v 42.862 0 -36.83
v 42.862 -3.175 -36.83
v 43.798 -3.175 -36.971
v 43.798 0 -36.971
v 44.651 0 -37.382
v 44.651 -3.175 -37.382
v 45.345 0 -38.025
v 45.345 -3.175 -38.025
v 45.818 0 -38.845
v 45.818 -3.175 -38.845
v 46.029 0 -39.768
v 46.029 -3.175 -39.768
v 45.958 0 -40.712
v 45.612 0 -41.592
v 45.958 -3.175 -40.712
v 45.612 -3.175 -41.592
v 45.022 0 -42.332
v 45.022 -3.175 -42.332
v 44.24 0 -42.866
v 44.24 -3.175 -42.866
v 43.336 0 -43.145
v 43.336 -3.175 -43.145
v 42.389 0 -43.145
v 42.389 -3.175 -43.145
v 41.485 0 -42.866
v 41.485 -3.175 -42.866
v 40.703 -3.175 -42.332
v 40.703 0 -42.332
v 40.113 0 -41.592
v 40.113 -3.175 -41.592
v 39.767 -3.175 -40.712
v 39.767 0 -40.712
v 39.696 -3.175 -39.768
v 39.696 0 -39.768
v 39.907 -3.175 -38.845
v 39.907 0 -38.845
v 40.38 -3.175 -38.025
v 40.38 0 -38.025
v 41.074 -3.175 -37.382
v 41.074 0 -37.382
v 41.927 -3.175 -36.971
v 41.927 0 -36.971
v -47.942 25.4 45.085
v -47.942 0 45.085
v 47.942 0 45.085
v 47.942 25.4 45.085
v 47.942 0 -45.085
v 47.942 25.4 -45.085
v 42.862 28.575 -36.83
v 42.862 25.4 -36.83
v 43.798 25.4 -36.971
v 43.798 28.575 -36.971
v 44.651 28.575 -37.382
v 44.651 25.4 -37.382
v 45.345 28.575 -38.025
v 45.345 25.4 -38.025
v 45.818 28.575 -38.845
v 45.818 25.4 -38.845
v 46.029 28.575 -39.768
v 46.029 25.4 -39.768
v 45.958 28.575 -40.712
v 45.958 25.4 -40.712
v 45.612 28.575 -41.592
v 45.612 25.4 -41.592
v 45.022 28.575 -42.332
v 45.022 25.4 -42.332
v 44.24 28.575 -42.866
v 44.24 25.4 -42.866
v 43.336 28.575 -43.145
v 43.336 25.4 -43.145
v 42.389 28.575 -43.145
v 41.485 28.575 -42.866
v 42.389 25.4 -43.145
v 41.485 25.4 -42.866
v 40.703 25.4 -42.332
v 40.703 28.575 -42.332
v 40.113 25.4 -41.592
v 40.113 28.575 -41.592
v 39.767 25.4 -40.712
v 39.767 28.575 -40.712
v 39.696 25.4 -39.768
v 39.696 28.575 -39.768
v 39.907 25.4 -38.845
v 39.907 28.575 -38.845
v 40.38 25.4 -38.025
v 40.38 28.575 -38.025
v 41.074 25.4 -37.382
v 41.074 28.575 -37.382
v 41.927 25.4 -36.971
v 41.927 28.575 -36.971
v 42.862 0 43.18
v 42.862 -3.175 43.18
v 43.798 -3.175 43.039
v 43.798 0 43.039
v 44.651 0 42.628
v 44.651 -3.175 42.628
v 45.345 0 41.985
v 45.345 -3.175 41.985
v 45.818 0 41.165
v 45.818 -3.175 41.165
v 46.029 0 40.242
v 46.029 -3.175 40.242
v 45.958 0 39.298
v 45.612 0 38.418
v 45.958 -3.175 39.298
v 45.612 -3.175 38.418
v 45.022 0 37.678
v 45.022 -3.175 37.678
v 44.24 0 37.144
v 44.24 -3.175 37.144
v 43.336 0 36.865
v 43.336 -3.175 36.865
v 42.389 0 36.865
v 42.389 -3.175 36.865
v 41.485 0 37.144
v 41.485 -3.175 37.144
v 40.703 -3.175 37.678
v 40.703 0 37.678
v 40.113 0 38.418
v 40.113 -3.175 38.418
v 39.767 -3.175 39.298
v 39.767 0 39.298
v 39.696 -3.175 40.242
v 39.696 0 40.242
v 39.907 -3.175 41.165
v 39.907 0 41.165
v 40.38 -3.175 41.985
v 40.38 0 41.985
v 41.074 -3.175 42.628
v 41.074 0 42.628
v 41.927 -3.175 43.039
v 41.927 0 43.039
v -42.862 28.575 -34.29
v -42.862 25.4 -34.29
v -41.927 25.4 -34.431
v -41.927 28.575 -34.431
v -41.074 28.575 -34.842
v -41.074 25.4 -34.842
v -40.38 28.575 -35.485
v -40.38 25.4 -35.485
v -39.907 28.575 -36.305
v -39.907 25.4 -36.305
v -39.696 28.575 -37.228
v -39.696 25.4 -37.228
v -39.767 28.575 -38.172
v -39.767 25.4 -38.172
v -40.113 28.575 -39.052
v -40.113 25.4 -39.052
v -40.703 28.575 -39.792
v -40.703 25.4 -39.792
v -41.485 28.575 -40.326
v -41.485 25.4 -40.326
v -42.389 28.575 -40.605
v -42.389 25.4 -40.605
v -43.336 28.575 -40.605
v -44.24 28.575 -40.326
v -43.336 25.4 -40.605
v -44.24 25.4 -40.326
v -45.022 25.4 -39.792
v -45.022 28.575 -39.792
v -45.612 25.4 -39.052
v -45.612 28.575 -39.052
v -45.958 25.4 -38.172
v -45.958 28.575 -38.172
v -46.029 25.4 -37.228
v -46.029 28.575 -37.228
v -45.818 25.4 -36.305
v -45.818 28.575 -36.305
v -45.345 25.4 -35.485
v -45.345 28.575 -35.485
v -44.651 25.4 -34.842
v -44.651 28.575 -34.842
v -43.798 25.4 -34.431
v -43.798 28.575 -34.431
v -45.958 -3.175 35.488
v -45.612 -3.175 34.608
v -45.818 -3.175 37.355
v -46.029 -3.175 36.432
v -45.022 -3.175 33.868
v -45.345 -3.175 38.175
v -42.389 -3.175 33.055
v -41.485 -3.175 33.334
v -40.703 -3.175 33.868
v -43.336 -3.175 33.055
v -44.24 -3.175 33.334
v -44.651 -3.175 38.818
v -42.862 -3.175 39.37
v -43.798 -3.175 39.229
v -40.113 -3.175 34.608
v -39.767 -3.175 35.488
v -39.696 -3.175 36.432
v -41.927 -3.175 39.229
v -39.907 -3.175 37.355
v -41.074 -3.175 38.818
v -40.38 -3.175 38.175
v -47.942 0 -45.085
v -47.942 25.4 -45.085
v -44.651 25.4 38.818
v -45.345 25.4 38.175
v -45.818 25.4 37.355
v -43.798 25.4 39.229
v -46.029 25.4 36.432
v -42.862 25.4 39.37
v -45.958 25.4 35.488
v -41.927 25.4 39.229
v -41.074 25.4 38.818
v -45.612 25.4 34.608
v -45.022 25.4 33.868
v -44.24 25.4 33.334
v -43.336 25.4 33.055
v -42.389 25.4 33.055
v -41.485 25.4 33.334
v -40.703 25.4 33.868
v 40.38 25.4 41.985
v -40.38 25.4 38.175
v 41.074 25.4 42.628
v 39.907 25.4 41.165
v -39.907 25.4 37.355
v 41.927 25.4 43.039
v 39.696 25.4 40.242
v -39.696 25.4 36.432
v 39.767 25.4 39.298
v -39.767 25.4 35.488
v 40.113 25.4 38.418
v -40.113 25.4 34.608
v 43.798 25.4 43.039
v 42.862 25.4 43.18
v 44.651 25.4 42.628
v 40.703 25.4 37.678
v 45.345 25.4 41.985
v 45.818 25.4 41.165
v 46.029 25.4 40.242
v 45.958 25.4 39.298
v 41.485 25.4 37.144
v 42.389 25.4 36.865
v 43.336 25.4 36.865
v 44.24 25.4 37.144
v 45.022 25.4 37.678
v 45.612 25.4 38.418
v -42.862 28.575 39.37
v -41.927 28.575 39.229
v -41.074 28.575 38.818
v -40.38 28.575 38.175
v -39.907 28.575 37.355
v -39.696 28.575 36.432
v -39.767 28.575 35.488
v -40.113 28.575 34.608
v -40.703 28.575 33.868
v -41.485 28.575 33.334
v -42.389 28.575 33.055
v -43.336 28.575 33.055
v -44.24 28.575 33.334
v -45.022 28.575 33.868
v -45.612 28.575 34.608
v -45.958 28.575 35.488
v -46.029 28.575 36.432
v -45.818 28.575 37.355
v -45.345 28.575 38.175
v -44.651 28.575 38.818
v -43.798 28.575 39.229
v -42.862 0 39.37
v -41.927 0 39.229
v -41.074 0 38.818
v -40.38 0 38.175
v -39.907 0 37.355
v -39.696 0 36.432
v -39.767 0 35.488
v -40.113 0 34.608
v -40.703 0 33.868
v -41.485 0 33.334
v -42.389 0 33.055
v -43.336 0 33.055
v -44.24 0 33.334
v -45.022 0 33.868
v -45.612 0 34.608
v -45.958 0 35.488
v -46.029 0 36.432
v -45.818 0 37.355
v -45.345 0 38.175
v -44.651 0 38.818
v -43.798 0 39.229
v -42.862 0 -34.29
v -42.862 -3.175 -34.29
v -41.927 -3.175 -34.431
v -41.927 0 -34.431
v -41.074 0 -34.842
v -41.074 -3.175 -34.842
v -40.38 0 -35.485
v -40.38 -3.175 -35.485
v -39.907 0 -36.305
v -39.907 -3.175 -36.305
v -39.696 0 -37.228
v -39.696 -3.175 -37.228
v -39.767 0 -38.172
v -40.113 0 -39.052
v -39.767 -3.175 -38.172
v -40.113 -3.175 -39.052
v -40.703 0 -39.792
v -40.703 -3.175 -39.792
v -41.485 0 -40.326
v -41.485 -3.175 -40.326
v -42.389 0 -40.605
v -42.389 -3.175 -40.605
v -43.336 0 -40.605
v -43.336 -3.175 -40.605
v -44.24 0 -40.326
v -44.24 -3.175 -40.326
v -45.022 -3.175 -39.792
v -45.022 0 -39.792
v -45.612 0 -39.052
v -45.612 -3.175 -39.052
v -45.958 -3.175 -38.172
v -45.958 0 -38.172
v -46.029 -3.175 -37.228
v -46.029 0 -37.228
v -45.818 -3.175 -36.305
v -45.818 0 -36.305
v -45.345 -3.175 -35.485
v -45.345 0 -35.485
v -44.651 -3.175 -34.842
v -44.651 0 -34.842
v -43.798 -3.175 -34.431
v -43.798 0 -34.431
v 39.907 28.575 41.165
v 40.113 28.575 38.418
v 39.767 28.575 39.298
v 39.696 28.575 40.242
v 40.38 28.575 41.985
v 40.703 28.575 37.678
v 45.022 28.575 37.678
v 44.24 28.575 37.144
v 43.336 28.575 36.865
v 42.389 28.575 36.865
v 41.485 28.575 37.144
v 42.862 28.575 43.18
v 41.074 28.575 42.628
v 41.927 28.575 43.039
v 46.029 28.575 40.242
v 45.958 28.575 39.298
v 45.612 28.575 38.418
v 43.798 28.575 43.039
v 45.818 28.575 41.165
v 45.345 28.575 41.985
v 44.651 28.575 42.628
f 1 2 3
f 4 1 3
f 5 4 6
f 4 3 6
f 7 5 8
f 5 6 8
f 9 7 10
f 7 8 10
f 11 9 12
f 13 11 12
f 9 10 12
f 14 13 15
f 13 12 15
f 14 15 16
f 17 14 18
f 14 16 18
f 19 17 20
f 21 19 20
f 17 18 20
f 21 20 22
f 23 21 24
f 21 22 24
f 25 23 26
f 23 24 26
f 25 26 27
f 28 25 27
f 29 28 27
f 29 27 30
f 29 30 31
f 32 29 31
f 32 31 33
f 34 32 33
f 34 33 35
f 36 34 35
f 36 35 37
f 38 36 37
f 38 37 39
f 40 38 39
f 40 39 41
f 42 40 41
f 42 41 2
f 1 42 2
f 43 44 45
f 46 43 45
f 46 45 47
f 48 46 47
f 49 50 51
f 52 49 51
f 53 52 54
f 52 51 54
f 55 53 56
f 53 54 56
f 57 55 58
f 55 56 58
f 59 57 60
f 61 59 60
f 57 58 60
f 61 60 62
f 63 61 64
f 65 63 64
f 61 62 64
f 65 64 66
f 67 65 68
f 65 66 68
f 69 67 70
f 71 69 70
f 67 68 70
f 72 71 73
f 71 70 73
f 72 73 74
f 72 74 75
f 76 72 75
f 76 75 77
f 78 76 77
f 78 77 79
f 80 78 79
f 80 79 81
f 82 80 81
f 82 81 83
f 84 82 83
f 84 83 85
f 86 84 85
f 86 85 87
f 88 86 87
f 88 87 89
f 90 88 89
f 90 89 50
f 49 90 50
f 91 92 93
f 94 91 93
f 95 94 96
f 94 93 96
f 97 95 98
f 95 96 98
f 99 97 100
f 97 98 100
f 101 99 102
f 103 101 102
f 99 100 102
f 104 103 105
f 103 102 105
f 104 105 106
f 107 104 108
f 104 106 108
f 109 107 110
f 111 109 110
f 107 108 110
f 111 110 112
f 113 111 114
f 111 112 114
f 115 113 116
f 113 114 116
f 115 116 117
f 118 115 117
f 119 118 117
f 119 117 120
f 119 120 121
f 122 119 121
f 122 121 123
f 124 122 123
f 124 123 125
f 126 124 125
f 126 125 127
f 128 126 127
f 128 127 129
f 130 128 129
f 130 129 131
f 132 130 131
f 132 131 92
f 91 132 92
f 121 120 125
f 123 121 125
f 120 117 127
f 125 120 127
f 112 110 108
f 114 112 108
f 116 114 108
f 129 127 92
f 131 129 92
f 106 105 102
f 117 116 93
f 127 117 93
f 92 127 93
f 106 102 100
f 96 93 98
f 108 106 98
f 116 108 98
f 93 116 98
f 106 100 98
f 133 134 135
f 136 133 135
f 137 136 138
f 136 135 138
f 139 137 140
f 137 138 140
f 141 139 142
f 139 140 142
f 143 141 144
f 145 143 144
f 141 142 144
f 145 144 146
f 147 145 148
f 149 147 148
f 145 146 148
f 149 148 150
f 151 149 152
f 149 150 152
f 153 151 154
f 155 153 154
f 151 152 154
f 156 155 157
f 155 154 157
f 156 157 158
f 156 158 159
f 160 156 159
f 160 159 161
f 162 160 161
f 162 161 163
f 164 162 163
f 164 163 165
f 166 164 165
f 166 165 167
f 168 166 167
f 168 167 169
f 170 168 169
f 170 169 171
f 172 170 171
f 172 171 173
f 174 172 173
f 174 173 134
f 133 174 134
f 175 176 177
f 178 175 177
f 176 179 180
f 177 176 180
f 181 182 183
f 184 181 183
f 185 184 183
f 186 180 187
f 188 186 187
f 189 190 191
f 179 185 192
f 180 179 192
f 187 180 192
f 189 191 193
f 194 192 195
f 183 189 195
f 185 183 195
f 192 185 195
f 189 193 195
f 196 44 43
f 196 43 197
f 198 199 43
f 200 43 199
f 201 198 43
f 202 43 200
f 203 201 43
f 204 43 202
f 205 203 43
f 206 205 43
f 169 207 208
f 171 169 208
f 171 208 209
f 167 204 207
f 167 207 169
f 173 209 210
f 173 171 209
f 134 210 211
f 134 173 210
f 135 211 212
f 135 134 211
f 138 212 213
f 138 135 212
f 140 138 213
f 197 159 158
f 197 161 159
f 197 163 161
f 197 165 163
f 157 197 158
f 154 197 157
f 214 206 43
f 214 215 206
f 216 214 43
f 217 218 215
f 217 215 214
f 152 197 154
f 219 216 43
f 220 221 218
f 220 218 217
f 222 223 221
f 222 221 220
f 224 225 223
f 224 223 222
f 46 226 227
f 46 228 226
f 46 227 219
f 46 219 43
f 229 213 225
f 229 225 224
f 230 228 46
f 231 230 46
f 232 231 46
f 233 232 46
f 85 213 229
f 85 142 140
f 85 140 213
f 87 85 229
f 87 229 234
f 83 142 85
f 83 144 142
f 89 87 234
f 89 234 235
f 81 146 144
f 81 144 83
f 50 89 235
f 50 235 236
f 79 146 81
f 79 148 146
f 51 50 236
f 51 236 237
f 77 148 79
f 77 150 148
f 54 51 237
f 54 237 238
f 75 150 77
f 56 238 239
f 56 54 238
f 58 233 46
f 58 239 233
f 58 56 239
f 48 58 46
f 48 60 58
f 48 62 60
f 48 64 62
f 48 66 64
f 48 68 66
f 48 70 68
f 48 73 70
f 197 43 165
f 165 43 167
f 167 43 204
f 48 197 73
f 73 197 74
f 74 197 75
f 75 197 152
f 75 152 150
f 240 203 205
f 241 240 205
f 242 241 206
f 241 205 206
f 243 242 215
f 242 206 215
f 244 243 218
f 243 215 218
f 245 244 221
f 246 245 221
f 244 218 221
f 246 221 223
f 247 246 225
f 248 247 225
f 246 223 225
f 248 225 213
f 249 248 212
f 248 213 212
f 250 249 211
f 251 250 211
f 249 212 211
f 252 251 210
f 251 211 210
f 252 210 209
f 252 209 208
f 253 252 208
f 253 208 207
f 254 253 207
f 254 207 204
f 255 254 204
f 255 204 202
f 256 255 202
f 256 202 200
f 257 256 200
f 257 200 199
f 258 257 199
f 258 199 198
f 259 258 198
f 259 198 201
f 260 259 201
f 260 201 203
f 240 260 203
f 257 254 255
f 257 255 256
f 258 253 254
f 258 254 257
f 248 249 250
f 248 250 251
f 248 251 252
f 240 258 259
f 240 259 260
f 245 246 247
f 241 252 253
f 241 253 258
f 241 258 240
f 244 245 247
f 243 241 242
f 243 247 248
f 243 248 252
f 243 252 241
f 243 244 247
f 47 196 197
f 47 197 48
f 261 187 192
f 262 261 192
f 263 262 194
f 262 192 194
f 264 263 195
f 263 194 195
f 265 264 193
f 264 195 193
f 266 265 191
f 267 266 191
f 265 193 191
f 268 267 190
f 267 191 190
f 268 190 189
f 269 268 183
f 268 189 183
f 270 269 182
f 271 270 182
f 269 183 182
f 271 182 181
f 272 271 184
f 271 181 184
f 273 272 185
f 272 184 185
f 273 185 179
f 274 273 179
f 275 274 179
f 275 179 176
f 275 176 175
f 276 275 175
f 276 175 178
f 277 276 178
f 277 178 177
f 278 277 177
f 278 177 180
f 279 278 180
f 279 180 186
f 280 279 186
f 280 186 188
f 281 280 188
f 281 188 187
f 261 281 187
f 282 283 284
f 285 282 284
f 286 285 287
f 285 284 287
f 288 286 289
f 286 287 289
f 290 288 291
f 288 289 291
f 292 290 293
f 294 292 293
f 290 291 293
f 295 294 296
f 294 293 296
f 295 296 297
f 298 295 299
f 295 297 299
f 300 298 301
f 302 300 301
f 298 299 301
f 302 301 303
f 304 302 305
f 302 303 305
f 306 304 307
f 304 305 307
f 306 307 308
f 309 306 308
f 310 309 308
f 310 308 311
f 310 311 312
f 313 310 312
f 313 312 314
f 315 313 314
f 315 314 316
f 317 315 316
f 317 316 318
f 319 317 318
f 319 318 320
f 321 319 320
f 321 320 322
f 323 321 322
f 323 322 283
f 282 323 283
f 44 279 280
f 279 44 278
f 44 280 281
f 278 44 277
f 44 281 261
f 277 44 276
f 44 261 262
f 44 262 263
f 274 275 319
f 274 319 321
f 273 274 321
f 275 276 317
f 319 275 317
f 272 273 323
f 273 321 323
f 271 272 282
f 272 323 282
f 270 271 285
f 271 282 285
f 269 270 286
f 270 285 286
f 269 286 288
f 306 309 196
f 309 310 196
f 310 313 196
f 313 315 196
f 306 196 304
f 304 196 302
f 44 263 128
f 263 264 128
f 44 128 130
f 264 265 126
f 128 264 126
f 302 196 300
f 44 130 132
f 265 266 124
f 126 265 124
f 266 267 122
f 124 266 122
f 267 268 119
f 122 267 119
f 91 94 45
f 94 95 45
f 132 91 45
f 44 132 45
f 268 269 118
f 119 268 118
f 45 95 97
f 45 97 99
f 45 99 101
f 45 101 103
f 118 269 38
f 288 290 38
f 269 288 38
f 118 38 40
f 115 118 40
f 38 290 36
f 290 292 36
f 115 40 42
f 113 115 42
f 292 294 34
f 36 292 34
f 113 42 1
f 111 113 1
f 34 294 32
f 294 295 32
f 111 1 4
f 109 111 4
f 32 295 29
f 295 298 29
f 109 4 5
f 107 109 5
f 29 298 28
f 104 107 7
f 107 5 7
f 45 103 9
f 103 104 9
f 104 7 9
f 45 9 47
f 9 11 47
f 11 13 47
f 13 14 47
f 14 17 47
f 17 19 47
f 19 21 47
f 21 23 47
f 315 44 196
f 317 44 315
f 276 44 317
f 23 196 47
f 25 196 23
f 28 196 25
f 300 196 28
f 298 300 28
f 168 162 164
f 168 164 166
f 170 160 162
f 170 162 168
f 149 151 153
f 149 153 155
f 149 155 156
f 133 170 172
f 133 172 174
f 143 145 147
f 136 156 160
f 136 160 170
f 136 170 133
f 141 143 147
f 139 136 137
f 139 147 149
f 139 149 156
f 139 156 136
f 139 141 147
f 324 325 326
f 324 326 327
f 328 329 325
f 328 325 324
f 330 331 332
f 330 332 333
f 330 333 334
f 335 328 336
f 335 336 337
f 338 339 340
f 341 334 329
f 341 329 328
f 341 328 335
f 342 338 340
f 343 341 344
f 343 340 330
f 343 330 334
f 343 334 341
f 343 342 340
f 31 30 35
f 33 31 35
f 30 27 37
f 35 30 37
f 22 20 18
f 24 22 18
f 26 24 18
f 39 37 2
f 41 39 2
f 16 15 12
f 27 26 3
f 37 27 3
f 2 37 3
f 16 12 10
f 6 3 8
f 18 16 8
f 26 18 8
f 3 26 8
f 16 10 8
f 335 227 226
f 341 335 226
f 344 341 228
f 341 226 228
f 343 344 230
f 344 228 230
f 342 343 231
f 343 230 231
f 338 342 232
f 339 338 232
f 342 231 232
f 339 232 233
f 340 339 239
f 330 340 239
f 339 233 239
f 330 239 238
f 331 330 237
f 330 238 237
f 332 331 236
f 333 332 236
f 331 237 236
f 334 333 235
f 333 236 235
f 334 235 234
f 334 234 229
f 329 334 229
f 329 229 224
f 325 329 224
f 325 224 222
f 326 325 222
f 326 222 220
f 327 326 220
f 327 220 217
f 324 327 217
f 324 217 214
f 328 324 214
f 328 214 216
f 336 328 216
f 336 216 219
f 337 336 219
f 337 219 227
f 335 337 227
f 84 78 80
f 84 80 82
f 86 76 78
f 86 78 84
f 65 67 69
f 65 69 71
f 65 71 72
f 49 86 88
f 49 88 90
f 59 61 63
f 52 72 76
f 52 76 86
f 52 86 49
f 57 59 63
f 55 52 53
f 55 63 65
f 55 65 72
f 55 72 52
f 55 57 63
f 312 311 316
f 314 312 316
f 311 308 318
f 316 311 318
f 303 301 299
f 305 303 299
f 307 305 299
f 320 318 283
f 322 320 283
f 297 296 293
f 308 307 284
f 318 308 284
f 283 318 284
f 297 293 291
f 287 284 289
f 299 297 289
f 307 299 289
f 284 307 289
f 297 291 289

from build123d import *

# Parameters (mm, degrees)
SKETCH1_W                = 95.885
SKETCH1_H                = 90.17
SKETCH1_R                = 3.175
BOSS_EXTRUDE1_DEPTH      = 25.4
BOSS_EXTRUDE2_DEPTH      = 28.575
BOSS_EXTRUDE2_DEPTH_BACK = 3.175
SKETCH1_2_R              = 3.175


with BuildPart() as part:
    # Sketch1 → Boss-Extrude1 (new body)
    with BuildSketch(Plane(origin=(0, 0, 0), x_dir=(1, 0, 0), z_dir=(0, 1, 0))):
        Rectangle(SKETCH1_W, SKETCH1_H)
        with Locations((-42.8625, 37.465)):
            Circle(SKETCH1_R, mode=Mode.SUBTRACT)
        with Locations((-42.8625, -36.195)):
            Circle(SKETCH1_R, mode=Mode.SUBTRACT)
        with Locations((42.8625, 40.005)):
            Circle(SKETCH1_R, mode=Mode.SUBTRACT)
        with Locations((42.8625, -40.005)):
            Circle(SKETCH1_R, mode=Mode.SUBTRACT)
    extrude(amount=BOSS_EXTRUDE1_DEPTH)

    # Sketch1<2> → Boss-Extrude2 (add, two sides: drawn at the far end of the back side and taken through both)
    with BuildSketch(Plane(origin=(0, 0, 0), x_dir=(1, 0, 0), z_dir=(0, 1, 0)).offset(-BOSS_EXTRUDE2_DEPTH_BACK)):
        with Locations((-42.8625, 37.465)):
            Circle(SKETCH1_2_R)
        with Locations((-42.8625, -36.195)):
            Circle(SKETCH1_2_R)
        with Locations((42.8625, 40.005)):
            Circle(SKETCH1_2_R)
        with Locations((42.8625, -40.005)):
            Circle(SKETCH1_2_R)
    extrude(amount=BOSS_EXTRUDE2_DEPTH + BOSS_EXTRUDE2_DEPTH_BACK)


solid = part.part
